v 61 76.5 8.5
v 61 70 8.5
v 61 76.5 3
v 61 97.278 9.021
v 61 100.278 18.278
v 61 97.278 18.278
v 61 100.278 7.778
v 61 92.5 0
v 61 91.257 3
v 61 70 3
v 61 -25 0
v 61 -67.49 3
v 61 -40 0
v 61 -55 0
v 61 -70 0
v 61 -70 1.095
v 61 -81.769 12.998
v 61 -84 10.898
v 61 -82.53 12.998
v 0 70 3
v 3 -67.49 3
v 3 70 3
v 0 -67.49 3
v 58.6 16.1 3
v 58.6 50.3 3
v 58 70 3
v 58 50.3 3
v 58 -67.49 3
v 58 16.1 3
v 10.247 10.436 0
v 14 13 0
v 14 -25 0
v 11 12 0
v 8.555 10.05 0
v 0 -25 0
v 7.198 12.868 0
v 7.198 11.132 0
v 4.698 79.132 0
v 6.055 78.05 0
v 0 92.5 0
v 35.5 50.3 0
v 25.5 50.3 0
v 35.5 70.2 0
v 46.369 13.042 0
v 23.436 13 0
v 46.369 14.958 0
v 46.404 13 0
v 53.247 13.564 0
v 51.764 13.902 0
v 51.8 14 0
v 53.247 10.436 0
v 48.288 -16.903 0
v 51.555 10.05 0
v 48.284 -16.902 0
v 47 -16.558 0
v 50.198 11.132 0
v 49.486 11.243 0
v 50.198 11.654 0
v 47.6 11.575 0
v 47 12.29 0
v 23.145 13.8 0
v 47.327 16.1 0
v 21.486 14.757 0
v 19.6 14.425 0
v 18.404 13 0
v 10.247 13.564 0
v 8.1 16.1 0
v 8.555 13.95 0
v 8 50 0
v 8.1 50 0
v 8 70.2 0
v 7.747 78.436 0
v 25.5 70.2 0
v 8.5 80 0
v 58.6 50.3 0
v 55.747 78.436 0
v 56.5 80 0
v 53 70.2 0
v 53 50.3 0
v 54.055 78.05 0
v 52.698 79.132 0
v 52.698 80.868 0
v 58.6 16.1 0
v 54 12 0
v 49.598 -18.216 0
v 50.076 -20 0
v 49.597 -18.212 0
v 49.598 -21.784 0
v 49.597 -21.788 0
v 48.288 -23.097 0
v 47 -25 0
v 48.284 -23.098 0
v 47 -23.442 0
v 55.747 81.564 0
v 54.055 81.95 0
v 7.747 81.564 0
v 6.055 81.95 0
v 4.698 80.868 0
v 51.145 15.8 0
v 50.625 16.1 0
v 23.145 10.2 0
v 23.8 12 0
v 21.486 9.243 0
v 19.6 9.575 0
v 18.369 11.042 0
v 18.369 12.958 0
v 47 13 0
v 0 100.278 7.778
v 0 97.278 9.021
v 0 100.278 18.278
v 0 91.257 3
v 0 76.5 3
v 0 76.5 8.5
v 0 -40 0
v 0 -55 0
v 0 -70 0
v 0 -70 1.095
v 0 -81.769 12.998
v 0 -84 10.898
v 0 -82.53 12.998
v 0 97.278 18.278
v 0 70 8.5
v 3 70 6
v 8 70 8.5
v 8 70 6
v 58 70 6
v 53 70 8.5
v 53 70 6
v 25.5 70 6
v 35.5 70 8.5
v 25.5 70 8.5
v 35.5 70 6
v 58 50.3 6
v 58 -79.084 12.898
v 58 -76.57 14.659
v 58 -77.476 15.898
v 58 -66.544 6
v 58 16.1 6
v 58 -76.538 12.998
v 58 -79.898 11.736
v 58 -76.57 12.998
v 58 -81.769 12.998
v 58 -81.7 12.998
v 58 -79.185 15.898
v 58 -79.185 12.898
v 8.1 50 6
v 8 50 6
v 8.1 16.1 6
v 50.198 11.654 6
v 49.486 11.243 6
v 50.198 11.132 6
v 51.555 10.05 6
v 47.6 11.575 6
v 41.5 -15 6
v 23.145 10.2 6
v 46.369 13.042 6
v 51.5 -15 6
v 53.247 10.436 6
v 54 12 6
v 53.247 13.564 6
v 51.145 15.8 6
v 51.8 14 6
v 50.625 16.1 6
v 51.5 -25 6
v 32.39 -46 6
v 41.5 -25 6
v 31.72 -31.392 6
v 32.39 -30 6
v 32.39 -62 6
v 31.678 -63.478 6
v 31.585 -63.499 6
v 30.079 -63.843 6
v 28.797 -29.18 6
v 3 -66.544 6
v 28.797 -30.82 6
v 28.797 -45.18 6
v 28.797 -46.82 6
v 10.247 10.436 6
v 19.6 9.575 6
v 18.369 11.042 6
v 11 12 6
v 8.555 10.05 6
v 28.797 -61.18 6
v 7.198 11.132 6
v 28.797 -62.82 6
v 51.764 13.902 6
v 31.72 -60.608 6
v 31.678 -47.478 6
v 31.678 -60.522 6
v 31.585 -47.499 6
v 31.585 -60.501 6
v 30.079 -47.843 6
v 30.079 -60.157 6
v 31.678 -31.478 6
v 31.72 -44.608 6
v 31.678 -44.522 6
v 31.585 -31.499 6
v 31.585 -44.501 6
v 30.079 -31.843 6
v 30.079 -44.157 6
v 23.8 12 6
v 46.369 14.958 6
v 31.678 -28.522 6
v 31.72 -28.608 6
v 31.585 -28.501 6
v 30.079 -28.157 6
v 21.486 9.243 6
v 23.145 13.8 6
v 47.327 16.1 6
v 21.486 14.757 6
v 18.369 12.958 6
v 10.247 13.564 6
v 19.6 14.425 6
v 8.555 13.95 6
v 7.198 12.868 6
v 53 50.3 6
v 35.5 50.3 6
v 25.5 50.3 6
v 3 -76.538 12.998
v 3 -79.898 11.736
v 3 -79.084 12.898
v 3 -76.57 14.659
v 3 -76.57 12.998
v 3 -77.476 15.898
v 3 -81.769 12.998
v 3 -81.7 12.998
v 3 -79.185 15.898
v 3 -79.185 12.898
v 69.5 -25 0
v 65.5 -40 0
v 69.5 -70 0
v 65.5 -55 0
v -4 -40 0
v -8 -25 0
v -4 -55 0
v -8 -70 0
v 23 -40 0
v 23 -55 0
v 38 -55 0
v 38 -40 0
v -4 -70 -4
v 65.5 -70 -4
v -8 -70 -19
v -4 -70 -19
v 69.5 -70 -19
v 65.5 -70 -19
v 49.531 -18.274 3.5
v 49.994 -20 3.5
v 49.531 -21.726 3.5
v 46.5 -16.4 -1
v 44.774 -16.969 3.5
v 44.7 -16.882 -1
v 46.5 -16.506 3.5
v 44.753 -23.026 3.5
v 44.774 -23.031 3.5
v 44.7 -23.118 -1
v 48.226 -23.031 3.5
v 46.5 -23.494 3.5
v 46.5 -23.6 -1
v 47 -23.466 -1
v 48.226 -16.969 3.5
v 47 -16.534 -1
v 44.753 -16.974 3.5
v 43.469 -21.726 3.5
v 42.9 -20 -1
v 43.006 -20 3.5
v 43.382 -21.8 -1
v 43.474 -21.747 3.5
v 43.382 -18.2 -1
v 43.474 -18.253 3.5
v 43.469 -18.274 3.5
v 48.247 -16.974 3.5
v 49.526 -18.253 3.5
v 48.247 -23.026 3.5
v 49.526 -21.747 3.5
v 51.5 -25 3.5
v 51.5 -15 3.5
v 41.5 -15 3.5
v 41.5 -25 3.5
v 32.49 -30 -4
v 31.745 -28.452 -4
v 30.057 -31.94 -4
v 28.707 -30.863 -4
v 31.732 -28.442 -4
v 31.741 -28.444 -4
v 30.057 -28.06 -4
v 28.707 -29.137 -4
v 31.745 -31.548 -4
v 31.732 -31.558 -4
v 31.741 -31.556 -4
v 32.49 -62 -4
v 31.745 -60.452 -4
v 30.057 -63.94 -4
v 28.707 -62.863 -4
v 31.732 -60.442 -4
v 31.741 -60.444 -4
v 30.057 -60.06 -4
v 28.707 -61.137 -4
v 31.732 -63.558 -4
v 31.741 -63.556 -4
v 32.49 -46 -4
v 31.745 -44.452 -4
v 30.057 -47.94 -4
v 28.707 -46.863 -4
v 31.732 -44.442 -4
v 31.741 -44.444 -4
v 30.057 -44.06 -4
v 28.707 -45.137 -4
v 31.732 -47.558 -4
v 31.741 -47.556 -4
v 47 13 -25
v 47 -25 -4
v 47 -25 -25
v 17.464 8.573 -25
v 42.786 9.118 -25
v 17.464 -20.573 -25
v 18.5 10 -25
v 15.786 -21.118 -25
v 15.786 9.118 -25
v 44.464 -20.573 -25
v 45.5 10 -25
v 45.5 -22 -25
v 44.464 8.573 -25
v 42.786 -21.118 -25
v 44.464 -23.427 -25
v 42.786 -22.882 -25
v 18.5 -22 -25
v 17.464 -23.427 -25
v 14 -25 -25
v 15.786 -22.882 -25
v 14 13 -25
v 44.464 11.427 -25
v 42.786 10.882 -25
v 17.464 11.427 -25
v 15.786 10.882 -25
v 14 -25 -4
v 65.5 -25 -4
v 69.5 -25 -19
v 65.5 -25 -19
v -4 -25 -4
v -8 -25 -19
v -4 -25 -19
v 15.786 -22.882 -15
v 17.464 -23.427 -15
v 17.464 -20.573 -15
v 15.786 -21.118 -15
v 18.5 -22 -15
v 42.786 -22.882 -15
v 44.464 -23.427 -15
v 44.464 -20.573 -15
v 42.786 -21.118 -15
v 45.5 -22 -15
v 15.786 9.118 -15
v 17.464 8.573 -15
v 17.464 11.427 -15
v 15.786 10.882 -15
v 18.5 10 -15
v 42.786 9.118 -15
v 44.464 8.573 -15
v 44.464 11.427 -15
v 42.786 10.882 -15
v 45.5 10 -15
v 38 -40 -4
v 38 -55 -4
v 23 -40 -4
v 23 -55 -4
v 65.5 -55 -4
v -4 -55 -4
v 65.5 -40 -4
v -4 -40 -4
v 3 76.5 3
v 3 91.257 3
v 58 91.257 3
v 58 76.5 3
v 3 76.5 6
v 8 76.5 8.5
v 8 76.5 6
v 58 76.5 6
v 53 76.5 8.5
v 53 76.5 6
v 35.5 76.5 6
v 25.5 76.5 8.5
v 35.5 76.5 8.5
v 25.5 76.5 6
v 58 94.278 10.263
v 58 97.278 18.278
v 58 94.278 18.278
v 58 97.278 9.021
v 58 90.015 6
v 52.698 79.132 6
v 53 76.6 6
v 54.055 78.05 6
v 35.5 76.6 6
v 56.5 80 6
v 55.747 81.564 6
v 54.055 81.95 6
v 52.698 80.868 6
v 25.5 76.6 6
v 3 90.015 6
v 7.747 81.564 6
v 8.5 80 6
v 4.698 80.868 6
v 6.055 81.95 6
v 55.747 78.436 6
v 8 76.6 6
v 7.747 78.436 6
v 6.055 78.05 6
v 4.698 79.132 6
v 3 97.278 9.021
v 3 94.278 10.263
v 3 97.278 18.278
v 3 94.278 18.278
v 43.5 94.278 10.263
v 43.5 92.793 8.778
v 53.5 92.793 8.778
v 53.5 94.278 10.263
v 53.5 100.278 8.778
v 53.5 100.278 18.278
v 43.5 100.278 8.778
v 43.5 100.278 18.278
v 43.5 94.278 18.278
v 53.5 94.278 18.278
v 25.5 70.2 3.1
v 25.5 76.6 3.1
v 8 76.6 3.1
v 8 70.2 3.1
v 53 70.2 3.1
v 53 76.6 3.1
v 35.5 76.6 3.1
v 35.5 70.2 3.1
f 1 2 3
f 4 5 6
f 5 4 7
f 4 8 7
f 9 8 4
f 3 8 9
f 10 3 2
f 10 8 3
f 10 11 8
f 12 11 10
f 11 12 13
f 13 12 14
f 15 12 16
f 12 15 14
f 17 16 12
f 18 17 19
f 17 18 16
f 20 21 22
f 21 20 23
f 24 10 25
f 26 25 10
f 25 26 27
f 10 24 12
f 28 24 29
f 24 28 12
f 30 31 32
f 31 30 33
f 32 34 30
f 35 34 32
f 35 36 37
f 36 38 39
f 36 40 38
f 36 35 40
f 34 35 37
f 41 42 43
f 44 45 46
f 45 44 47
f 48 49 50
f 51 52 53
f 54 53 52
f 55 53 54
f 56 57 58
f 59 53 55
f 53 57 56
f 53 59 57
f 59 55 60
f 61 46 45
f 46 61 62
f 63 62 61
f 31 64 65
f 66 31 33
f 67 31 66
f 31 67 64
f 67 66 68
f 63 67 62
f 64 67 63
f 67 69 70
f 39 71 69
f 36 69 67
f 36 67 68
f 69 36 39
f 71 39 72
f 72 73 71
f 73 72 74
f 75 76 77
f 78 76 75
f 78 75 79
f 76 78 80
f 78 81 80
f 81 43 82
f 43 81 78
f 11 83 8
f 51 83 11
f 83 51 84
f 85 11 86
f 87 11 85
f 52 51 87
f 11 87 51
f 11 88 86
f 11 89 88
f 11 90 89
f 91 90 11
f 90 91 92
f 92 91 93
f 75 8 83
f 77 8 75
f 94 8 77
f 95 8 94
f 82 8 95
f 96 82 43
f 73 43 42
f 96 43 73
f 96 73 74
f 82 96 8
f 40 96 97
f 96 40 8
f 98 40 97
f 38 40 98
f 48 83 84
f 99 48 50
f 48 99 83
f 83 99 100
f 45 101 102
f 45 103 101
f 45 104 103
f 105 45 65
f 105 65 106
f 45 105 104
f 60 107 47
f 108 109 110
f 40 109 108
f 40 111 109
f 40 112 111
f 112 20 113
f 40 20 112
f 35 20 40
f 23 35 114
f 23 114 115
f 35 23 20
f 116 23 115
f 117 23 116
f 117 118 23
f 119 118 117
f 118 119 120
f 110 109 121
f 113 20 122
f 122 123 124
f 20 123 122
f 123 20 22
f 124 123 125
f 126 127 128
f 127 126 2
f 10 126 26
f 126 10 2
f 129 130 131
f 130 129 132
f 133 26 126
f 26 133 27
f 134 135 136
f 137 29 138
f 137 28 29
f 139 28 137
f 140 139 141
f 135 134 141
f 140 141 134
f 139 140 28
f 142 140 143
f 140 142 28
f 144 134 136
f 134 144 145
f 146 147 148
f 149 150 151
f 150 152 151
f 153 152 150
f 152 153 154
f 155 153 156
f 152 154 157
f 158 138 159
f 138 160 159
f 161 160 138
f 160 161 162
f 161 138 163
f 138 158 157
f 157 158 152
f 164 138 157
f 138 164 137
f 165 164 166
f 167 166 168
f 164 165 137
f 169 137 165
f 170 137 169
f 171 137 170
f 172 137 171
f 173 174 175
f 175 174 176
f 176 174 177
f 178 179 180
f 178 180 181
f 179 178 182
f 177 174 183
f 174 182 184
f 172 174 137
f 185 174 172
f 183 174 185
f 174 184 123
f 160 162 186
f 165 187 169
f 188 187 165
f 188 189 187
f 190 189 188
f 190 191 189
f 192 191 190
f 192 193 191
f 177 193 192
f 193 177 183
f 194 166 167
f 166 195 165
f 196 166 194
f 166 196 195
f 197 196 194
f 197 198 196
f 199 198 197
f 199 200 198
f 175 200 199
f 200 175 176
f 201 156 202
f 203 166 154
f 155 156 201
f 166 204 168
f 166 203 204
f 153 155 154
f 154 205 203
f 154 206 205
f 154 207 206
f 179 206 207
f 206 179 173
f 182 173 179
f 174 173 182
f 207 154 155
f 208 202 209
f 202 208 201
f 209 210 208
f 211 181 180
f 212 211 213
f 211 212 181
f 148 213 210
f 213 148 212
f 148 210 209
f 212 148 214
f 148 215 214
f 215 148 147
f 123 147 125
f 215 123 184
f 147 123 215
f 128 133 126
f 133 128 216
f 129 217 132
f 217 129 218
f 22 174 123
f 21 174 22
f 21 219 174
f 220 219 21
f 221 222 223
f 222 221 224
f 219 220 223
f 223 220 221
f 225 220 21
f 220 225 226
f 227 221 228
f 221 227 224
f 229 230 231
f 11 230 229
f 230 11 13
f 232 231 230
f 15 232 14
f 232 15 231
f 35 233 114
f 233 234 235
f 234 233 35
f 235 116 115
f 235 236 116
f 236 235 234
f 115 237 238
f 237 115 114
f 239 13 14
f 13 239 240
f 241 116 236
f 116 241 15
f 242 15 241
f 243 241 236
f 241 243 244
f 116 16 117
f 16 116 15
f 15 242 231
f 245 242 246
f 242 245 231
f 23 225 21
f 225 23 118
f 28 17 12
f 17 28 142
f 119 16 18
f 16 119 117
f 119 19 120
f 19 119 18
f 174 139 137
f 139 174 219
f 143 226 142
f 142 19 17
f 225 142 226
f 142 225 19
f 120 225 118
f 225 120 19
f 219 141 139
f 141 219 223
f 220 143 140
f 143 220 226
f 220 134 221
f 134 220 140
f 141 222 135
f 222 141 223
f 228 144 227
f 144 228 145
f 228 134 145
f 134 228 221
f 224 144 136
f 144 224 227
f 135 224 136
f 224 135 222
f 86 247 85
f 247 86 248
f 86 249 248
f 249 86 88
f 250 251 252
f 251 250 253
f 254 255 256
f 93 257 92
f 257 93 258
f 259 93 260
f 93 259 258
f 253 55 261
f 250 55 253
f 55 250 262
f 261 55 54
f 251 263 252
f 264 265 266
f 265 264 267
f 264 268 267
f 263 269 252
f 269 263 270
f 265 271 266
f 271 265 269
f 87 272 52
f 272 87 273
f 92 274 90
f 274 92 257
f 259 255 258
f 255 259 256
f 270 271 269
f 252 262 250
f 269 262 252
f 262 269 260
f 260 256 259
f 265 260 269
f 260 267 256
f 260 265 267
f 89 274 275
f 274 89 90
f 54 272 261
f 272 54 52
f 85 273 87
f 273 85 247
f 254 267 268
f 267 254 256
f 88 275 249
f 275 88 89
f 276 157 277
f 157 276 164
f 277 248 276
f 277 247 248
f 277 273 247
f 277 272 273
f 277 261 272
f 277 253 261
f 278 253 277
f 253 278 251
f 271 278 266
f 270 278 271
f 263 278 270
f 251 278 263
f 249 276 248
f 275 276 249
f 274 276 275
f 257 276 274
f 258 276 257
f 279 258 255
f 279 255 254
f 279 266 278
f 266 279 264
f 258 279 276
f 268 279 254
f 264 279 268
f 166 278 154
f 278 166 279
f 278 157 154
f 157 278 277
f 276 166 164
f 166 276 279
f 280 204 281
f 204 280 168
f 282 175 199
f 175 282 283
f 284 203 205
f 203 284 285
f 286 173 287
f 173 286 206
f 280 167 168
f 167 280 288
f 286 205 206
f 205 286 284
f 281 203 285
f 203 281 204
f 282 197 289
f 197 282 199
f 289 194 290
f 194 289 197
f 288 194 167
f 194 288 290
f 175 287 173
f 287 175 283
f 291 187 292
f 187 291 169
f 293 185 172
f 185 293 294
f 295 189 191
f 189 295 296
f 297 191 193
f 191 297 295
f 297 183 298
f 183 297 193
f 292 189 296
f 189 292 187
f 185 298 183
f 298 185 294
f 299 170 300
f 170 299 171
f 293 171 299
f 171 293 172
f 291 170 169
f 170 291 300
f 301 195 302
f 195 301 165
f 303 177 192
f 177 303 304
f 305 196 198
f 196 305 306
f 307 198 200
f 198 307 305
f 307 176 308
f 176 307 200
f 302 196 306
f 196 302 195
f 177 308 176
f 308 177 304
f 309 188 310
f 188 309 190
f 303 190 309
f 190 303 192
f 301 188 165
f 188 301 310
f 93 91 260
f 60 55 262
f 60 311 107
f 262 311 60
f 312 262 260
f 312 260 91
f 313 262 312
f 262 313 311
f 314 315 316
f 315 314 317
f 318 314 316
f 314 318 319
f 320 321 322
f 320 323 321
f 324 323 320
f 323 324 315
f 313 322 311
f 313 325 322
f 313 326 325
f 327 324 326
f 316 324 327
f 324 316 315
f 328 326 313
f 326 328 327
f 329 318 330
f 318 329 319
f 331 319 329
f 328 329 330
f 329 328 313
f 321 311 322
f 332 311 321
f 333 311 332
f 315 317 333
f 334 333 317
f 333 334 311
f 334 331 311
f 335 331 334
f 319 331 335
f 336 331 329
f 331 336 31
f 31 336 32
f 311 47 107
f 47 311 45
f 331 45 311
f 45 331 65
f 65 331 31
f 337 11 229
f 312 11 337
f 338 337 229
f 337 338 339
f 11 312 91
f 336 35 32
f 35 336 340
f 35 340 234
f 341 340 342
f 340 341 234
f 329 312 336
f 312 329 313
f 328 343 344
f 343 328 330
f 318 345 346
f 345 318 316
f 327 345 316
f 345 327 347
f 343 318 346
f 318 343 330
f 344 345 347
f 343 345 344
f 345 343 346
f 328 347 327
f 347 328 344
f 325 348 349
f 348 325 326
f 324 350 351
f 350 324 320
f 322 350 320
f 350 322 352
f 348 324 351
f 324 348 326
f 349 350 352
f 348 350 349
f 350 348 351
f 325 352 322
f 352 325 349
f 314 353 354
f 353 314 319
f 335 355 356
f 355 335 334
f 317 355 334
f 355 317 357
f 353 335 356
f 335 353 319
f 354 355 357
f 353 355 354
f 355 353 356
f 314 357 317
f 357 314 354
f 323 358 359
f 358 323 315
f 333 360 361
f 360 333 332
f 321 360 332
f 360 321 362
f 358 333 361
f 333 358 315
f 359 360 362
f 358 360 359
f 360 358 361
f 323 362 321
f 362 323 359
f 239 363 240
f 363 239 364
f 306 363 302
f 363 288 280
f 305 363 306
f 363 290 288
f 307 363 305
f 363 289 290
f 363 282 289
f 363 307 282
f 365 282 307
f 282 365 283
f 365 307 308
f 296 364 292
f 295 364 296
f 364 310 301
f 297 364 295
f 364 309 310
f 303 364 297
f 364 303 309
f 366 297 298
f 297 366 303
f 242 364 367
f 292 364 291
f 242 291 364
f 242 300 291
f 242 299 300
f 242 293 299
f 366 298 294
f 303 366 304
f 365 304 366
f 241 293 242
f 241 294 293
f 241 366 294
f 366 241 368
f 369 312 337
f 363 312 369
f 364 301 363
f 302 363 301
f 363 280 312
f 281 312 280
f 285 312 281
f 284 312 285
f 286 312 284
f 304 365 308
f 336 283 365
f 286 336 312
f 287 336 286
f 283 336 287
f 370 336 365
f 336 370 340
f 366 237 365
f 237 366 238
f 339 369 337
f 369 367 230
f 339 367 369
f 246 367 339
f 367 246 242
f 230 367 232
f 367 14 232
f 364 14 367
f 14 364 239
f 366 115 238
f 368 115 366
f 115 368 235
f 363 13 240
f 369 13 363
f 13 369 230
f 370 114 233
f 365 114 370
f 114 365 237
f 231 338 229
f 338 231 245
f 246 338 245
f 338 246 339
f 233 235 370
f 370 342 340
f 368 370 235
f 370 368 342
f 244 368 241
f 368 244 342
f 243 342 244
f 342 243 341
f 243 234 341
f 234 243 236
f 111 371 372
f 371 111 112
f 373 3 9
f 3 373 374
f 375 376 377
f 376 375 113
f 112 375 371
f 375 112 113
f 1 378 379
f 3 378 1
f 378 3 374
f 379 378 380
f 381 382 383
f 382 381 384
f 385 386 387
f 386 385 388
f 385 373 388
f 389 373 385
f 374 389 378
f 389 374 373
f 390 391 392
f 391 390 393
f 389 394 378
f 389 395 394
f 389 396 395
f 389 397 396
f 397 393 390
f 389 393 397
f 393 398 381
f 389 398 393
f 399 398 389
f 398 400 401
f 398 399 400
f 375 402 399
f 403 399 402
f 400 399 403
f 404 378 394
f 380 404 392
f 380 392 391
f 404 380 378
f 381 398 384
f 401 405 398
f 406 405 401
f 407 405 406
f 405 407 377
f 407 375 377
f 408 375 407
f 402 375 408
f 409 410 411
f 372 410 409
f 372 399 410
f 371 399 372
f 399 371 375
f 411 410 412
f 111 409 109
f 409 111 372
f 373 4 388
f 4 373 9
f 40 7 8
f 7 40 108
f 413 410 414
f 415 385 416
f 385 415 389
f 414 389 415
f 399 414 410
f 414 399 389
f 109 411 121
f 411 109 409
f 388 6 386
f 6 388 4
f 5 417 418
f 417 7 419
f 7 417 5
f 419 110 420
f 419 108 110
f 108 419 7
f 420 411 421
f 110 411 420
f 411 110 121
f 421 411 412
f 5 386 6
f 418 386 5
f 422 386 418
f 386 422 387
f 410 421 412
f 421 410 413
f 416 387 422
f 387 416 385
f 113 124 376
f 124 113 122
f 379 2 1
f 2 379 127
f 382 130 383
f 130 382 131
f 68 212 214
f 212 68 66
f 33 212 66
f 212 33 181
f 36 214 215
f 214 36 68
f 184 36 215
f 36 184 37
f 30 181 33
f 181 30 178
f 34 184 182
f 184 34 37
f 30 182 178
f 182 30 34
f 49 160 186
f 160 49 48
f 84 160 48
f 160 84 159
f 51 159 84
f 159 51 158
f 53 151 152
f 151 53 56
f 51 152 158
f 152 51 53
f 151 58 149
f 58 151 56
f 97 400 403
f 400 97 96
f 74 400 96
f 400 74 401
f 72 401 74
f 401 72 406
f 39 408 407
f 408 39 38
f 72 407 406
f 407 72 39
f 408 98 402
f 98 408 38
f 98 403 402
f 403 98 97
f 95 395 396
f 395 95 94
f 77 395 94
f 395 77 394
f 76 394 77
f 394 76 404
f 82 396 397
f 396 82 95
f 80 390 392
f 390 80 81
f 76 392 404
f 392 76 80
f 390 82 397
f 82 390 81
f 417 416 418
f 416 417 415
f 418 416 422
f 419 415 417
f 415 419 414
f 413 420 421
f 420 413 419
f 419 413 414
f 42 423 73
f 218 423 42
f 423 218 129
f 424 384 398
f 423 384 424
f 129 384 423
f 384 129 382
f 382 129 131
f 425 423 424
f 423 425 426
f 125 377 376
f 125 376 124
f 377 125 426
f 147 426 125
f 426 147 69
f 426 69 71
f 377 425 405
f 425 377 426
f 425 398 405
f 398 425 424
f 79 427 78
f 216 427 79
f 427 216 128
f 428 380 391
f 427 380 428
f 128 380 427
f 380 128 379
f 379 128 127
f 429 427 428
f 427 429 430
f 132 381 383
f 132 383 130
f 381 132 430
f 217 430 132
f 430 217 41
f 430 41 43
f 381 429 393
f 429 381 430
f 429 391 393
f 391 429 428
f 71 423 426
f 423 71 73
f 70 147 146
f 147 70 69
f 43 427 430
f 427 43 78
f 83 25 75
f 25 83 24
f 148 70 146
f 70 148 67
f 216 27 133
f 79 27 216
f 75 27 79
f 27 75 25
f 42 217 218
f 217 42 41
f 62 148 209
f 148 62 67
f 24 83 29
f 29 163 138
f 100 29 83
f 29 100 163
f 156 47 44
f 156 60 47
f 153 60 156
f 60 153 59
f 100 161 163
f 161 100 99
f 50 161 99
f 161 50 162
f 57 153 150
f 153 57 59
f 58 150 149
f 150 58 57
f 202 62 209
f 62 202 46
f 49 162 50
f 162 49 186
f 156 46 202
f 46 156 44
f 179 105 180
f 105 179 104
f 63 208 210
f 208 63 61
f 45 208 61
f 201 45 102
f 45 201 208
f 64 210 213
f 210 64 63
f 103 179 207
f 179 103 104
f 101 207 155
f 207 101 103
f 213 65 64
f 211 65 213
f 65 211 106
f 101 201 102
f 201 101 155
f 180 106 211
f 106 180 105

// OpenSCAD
border= 3;
width= 55 + (2 * border);
first_screw_distance=20 - 12;
support_width = width - (border * 2);

module support(length) {
  translate([border,0,border]) {
    cube([support_width,length,border]);
  };
}

module base(length) {
  union(){
    cube([width,length,border]);
    support(length);
  };
}
module battery_pack() {
  b_length = 57;
  union(){
     for (i=[0:3])
       translate([i*(b_length)/4,0,0])
         cylinder(b_length, 8, 8, true);
    }
 }

module sbc_holes() {
  w = 2;
  y_d = 68;
  union(){
    cylinder(20, w, w, true);
    translate([48,0,0]) cylinder(20, w, w, true);
    translate([2.5,0,0]) {
	 translate([0,-y_d,0]) cylinder(20, w, w, true);
	 translate([43,-y_d,0]) cylinder(20, w, w, true);
    }
  }
}

module back_holes(d) {
  for (i=[0:2]) translate([width/2, d + (i*16), -5]){
    cylinder(100, 2);
    if(i == 2) {
        translate([20 - 4, 10, 4]) {
            cylinder(110, 3.6);
            translate([-5, -5, 4.5]) cube([10, 10, 10]);
        }
    }
  }
}

module chassis() {
  translate([0, -70]){
      difference() {
        angle = 35;
        translation = [0, -14, sin(angle) * 19];
        union() {
          base(70);
          difference() {
            translate(translation) {
              rotate([-angle, 0, 0]) {
                base(19);
              }
            }
            translate(translation + [-1, 0, 2.1]) {
                scale(1.1) {
                  cube([width, 10, 10]);
                }

                translate([border + 0.9 , -border + 5.3, 0.0])
                      rotate([-angle, 0, 0])
                          cube([support_width + 0.2, border/2 + .7, border/2]);
            }
          }
          translate(translation + [0, 2.2, border + 2]) {
              rotate([-90, 0, 0]) {
                scale([1,1,1/sin(angle) * .5]) {
                    difference() {
                      support(border);
                      rotate([40, 0, 0]) {
                        translate([-1, 2, 0.5]) {
                          scale(1.1) {
                            support(border);
                           }
                        }
                      }
                    }

                }
              }
          };
        }
	back_holes(first_screw_distance);
      }
      %translate([width/2, -9, -8]) {
	 *rotate([90, 0, 90]) battery_pack();
      }
      difference() {
	union() {
	   battery_holder_w = 15;
	   battery_holder_l = 45;
	   battery_length = 70;
	   height = 4;
	   battery_h = 15;
	   camera_l = 33;
	   camera_w = 38;
	   camera_h = 25;
	   translate([width/2 - battery_holder_w / 2, 0, -height]) {
		cube([battery_holder_w,battery_holder_l,height]);
	   }
	   translate([width/2 - battery_length / 2, 0, -height]) {
		cube([battery_length, battery_holder_w, height]);
	   }
	   translate([width/2 - battery_length / 2, battery_holder_l - battery_holder_w, -height]) {
		cube([battery_length, battery_holder_w, height]);
	   }
	   translate([battery_length - (height + 0.5), 0, -(battery_h + height)]) {
	   	cube([height, battery_holder_l, battery_h + height]);
	   }
	   translate([-(height*2), 0, -(battery_h + height)]) {
	   	cube([height, battery_holder_l, battery_h + height]);
	   }

	   translate([width/2 - (camera_l / 2), battery_holder_l, -camera_h]) {
		difference() {
		     c_w = 1.5;
		     margin = 3;
		     cube([camera_l,camera_w,camera_h]);
		     translate([margin,margin,0]) cylinder(20, c_w, c_w, true);
		     translate([camera_l - margin, margin, 0]) cylinder(20, c_w, c_w, true);
		     translate([margin,camera_w - margin,0]) cylinder(20, c_w, c_w, true);
		     translate([camera_l - margin,camera_w - margin,0]) cylinder(20, c_w, c_w, true);
		}
	   }
        }
	back_holes(first_screw_distance);
      }
  }

  function sum(v,i) = (i==len(v) ? 0 : v[i] + sum(v,i+1));

  s_0 = 70;
  s_1 = 6.5;
  s_2 = 16;
  s_3 = 11;
  s_4 = 10.5;
  difference() {
    union() {
      base(s_0);
      translate([0,s_0,0]) {
        base(s_1);
        cube([width, s_1, s_1 + 2]);
        translate([0, s_1]) base(s_2);
        translate([0, s_1 + s_2]) rotate([45,0,0]) base(s_3);
        translate([0, s_1 + s_2 + s_3 * cos(45), s_3 * cos(45)])
        rotate([90, 0, 0]) base(s_4);
      }
    }
    motor_w = 17.5;
    motor_l = 20.0;
    translate([0,s_0,0]) {
      translate([width - 17.5,s_1 + s_2, 1 + s_3 * cos(45)]) cube([10,10,10]);
      translate([8, -0.1, 3.1]) cube([motor_w, s_1 + 0.2,motor_w]);
      translate([width - 8 - motor_w, -0.1, 3.1]) cube([motor_w,s_1 + 0.2,motor_w]);

      translate([8, -motor_l, -0.1]) cube([motor_w, motor_l + 0.2,motor_w]);
      translate([width - 8 - motor_w, -motor_l, -0.1]) cube([motor_w, motor_l + 0.2,motor_w]);
      hole_l = 34;
      hole_w = 50;
      translate([width - hole_w - 2.9, -hole_l - motor_l + 0.1, -0.1]) cube([hole_w + 0.5, hole_l + 0.2,motor_w]);
  screw_1_r = 2.8;
      translate([width-12, -56, -0.1]) cylinder(110,screw_1_r, screw_1_r, true);
      screw_2_r = 2.8;
      translate([width - 40, -58, -0.1]) cylinder(20,screw_2_r, screw_2_r, true);
      translate([6.5,10,0]) sbc_holes();
    }
  }
}
chassis();
